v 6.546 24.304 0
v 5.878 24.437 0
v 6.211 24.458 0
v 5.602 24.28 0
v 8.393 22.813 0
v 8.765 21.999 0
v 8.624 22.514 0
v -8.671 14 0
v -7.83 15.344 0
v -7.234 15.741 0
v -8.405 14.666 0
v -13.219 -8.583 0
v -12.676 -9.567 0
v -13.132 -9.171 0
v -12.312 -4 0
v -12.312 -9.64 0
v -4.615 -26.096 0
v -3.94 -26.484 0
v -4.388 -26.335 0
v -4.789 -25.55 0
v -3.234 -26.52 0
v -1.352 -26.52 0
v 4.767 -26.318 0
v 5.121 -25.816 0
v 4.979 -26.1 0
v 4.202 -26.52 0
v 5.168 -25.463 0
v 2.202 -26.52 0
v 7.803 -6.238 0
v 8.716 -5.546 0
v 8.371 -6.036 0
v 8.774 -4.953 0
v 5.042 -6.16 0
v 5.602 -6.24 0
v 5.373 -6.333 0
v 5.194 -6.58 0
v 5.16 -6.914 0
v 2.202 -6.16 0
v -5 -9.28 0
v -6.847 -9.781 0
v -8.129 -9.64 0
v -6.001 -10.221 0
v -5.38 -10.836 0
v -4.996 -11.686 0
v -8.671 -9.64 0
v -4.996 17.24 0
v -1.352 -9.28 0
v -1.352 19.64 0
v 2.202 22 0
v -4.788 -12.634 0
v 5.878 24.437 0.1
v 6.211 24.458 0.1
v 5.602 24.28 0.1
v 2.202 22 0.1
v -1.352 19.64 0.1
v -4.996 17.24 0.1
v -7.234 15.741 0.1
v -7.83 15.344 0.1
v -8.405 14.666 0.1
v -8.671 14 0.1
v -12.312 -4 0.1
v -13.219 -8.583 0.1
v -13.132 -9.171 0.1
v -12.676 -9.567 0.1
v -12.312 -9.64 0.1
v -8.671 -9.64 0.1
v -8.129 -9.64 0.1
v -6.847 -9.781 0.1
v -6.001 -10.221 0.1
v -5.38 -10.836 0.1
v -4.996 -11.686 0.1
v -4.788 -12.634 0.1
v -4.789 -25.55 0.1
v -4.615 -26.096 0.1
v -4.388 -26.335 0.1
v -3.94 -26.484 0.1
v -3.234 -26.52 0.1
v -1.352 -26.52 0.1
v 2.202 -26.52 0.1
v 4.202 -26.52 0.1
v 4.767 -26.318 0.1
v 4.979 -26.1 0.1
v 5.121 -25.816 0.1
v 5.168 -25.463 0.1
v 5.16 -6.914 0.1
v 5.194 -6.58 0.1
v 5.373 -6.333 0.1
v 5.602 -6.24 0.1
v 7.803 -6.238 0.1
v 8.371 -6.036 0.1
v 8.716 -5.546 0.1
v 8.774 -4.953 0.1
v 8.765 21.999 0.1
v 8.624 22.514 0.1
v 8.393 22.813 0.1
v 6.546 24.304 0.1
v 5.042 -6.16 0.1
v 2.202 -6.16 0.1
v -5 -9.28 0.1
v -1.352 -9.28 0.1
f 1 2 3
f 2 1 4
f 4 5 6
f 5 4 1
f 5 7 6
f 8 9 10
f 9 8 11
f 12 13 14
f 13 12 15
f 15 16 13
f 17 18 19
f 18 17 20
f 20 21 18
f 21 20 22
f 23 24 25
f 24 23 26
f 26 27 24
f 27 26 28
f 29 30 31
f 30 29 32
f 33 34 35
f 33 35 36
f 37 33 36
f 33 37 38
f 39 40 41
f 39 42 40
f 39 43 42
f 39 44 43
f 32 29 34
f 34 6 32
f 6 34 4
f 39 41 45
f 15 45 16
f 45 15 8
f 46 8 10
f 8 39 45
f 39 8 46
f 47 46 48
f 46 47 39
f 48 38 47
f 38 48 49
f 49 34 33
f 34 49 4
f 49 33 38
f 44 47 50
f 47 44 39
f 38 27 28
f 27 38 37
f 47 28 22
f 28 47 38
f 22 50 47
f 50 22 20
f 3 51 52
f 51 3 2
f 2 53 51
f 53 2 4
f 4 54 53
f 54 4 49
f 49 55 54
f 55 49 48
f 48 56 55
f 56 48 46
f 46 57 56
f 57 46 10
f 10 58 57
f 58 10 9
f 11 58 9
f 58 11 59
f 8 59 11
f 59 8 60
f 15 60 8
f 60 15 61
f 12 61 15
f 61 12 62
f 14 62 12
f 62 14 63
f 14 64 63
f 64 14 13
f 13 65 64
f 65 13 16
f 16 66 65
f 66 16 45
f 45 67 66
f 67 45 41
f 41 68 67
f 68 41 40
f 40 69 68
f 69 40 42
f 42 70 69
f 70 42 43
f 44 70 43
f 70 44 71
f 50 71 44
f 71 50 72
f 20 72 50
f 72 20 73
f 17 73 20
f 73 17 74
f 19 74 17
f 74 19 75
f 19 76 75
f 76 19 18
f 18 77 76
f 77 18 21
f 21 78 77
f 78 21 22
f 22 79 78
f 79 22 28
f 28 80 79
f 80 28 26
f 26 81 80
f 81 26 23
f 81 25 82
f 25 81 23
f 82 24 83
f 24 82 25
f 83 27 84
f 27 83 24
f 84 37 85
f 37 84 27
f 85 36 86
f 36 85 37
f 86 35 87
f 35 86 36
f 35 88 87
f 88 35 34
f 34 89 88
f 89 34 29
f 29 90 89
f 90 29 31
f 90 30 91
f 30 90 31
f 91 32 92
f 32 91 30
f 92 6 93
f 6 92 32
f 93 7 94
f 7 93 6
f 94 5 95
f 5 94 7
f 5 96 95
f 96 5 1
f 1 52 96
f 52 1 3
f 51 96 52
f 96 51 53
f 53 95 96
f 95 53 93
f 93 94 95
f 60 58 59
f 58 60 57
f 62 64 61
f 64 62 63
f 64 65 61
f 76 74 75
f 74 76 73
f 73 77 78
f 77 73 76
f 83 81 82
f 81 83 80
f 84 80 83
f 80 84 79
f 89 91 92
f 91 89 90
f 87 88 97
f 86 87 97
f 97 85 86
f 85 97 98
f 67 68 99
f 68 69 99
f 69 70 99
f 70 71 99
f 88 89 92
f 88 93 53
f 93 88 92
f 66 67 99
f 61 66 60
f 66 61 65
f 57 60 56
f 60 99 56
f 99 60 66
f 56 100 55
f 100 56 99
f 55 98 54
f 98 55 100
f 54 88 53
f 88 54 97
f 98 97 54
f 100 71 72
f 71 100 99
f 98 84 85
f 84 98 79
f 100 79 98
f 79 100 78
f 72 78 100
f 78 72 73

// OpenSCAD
// file: s/13710as02.scad
use <../../lib.scad>
function ldraw_lib__s__13710as02() = [
// 0 ~Sticker Top for Technic Panel Fairing Smooth (Medium) Flat
// 0 Name: s\13710as02.dat
// 0 Author: Philippe Hurbain [Philo]
// 0 !LDRAW_ORG Subpart UPDATE 2022-02
// 0 !LICENSE Licensed under CC BY 2.0 and CC BY 4.0 : see CAreadme.txt
// 
// 0 BFC CERTIFY CCW
  [0,"BFC","CERTIFY"],
  [0,"BFC","CCW"],
// 
// 0 !HISTORY 2022-03-06 [PTadmin] Official Update 2022-02
// 
// 
// 0 // Top surface
// 4 16 16.364 -0.25 60.759 15.527 -0.25 61.145 14.695 -0.25 61.093 14.004 -0.25 60.7
  [4,16,16.364,-0.25,60.759,15.527,-0.25,61.145,14.695,-0.25,61.093,14.004,-0.25,60.7],
// 4 16 21.912 -0.25 54.998 20.983 -0.25 57.032 16.364 -0.25 60.759 14.004 -0.25 60.7
  [4,16,21.912,-0.25,54.998,20.983,-0.25,57.032,16.364,-0.25,60.759,14.004,-0.25,60.7],
// 3 16 21.912 -0.25 54.998 21.561 -0.25 56.284 20.983 -0.25 57.032
  [3,16,21.912,-0.25,54.998,21.561,-0.25,56.284,20.983,-0.25,57.032],
// 4 16 -18.084 -0.25 39.353 -19.575 -0.25 38.36 -21.013 -0.25 36.664 -21.677 -0.25 35
  [4,16,-18.084,-0.25,39.353,-19.575,-0.25,38.36,-21.013,-0.25,36.664,-21.677,-0.25,35],
// 4 16 -31.689 -0.25 -23.918 -30.78 -0.25 -10 -33.048 -0.25 -21.458 -32.83 -0.25 -22.928
  [4,16,-31.689,-0.25,-23.918,-30.78,-0.25,-10,-33.048,-0.25,-21.458,-32.83,-0.25,-22.928],
// 3 16 -31.689 -0.25 -23.918 -30.78 -0.25 -24.1 -30.78 -0.25 -10
  [3,16,-31.689,-0.25,-23.918,-30.78,-0.25,-24.1,-30.78,-0.25,-10],
// 4 16 -9.849 -0.25 -66.209 -11.972 -0.25 -63.874 -11.537 -0.25 -65.239 -10.971 -0.25 -65.837
  [4,16,-9.849,-0.25,-66.209,-11.972,-0.25,-63.874,-11.537,-0.25,-65.239,-10.971,-0.25,-65.837],
// 4 16 -3.379 -0.25 -66.3 -11.972 -0.25 -63.874 -9.849 -0.25 -66.209 -8.084 -0.25 -66.3
  [4,16,-3.379,-0.25,-66.3,-11.972,-0.25,-63.874,-9.849,-0.25,-66.209,-8.084,-0.25,-66.3],
// 4 16 12.802 -0.25 -64.539 10.504 -0.25 -66.3 11.917 -0.25 -65.795 12.448 -0.25 -65.249
  [4,16,12.802,-0.25,-64.539,10.504,-0.25,-66.3,11.917,-0.25,-65.795,12.448,-0.25,-65.249],
// 4 16 5.504 -0.25 -66.3 10.504 -0.25 -66.3 12.802 -0.25 -64.539 12.92 -0.25 -63.658
  [4,16,5.504,-0.25,-66.3,10.504,-0.25,-66.3,12.802,-0.25,-64.539,12.92,-0.25,-63.658],
// 4 16 19.507 -0.25 -15.595 20.928 -0.25 -15.089 21.79 -0.25 -13.866 21.935 -0.25 -12.382
  [4,16,19.507,-0.25,-15.595,20.928,-0.25,-15.089,21.79,-0.25,-13.866,21.935,-0.25,-12.382],
// 3 16 13.432 -0.25 -15.832 14.004 -0.25 -15.6 12.604 -0.25 -15.4
  [3,16,13.432,-0.25,-15.832,14.004,-0.25,-15.6,12.604,-0.25,-15.4],
// 3 16 12.984 -0.25 -16.45 13.432 -0.25 -15.832 12.604 -0.25 -15.4
  [3,16,12.984,-0.25,-16.45,13.432,-0.25,-15.832,12.604,-0.25,-15.4],
// 4 16 5.504 -0.25 -15.4 12.899 -0.25 -17.286 12.984 -0.25 -16.45 12.604 -0.25 -15.4
  [4,16,5.504,-0.25,-15.4,12.899,-0.25,-17.286,12.984,-0.25,-16.45,12.604,-0.25,-15.4],
// 3 16 -20.323 -0.25 -24.1 -17.118 -0.25 -24.453 -12.5 -0.25 -23.2
  [3,16,-20.323,-0.25,-24.1,-17.118,-0.25,-24.453,-12.5,-0.25,-23.2],
// 3 16 -17.118 -0.25 -24.453 -15.003 -0.25 -25.552 -12.5 -0.25 -23.2
  [3,16,-17.118,-0.25,-24.453,-15.003,-0.25,-25.552,-12.5,-0.25,-23.2],
// 3 16 -15.003 -0.25 -25.552 -13.45 -0.25 -27.089 -12.5 -0.25 -23.2
  [3,16,-15.003,-0.25,-25.552,-13.45,-0.25,-27.089,-12.5,-0.25,-23.2],
// 3 16 -13.45 -0.25 -27.089 -12.491 -0.25 -29.214 -12.5 -0.25 -23.2
  [3,16,-13.45,-0.25,-27.089,-12.491,-0.25,-29.214,-12.5,-0.25,-23.2],
// 3 16 14.004 -0.25 -15.6 19.507 -0.25 -15.595 21.935 -0.25 -12.382
  [3,16,14.004,-0.25,-15.6,19.507,-0.25,-15.595,21.935,-0.25,-12.382],
// 4 16 14.004 -0.25 60.7 14.004 -0.25 -15.6 21.935 -0.25 -12.382 21.912 -0.25 54.998
  [4,16,14.004,-0.25,60.7,14.004,-0.25,-15.6,21.935,-0.25,-12.382,21.912,-0.25,54.998],
// 3 16 -21.677 -0.25 -24.1 -20.323 -0.25 -24.1 -12.5 -0.25 -23.2
  [3,16,-21.677,-0.25,-24.1,-20.323,-0.25,-24.1,-12.5,-0.25,-23.2],
// 4 16 -30.78 -0.25 -24.1 -21.677 -0.25 -24.1 -21.677 -0.25 35 -30.78 -0.25 -10
  [4,16,-30.78,-0.25,-24.1,-21.677,-0.25,-24.1,-21.677,-0.25,35,-30.78,-0.25,-10],
// 3 16 -18.084 -0.25 39.353 -21.677 -0.25 35 -12.491 -0.25 43.1
  [3,16,-18.084,-0.25,39.353,-21.677,-0.25,35,-12.491,-0.25,43.1],
// 4 16 -21.677 -0.25 35 -21.677 -0.25 -24.1 -12.5 -0.25 -23.2 -12.491 -0.25 43.1
  [4,16,-21.677,-0.25,35,-21.677,-0.25,-24.1,-12.5,-0.25,-23.2,-12.491,-0.25,43.1],
// 4 16 -12.5 -0.25 -23.2 -3.379 -0.25 -23.2 -3.379 -0.25 49.1 -12.491 -0.25 43.1
  [4,16,-12.5,-0.25,-23.2,-3.379,-0.25,-23.2,-3.379,-0.25,49.1,-12.491,-0.25,43.1],
// 4 16 -3.379 -0.25 -23.2 5.504 -0.25 -15.4 5.504 -0.25 55 -3.379 -0.25 49.1
  [4,16,-3.379,-0.25,-23.2,5.504,-0.25,-15.4,5.504,-0.25,55,-3.379,-0.25,49.1],
// 4 16 14.004 -0.25 60.7 5.504 -0.25 55 12.604 -0.25 -15.4 14.004 -0.25 -15.6
  [4,16,14.004,-0.25,60.7,5.504,-0.25,55,12.604,-0.25,-15.4,14.004,-0.25,-15.6],
// 3 16 5.504 -0.25 -15.4 12.604 -0.25 -15.4 5.504 -0.25 55
  [3,16,5.504,-0.25,-15.4,12.604,-0.25,-15.4,5.504,-0.25,55],
// 4 16 -11.97 -0.25 -31.586 -3.379 -0.25 -23.2 -12.5 -0.25 -23.2 -12.491 -0.25 -29.214
  [4,16,-11.97,-0.25,-31.586,-3.379,-0.25,-23.2,-12.5,-0.25,-23.2,-12.491,-0.25,-29.214],
// 4 16 5.504 -0.25 -66.3 12.92 -0.25 -63.658 12.899 -0.25 -17.286 5.504 -0.25 -15.4
  [4,16,5.504,-0.25,-66.3,12.92,-0.25,-63.658,12.899,-0.25,-17.286,5.504,-0.25,-15.4],
// 4 16 -3.379 -0.25 -66.3 5.504 -0.25 -66.3 5.504 -0.25 -15.4 -3.379 -0.25 -23.2
  [4,16,-3.379,-0.25,-66.3,5.504,-0.25,-66.3,5.504,-0.25,-15.4,-3.379,-0.25,-23.2],
// 4 16 -11.972 -0.25 -63.874 -3.379 -0.25 -66.3 -3.379 -0.25 -23.2 -11.97 -0.25 -31.586
  [4,16,-11.972,-0.25,-63.874,-3.379,-0.25,-66.3,-3.379,-0.25,-23.2,-11.97,-0.25,-31.586],
];
module ldraw_lib__s__13710as02(step=0, col=false, unit=2/5, alt=false, line=0.2, solid=!$preview)
    makepoly(ldraw_lib__s__13710as02(), step=step, col=col, unit=unit, alt=alt, line=line, solid=solid);
ldraw_lib__s__13710as02(line=0.2);
// main file
use <../lib.scad>
use <s/13710as01.scad>
use <s/13710as02.scad>
function ldraw_lib__13710f() = [
// 0 Sticker Mindstorms EV3 #6 for Panel Smooth Medium (Needs Work)
// 0 Name: 13710f.dat
// 0 Author: Philippe Hurbain [Philo]
// 0 !LDRAW_ORG Part UPDATE 2022-02
// 0 !LICENSE Licensed under CC BY 2.0 and CC BY 4.0 : see CAreadme.txt
// 
// 0 !HELP To be used with panel 64391
// 
// 0 BFC CERTIFY CCW
  [0,"BFC","CERTIFY"],
  [0,"BFC","CCW"],
// 
// 0 !HISTORY 2022-03-06 [PTadmin] Official Update 2022-02
// 
// 
// 0 // Image file courtesy of the LEGO MINDSTORMS Team
// 0 // Needs Work: Missing more detailed fallback pattern
// 
// 1 16 0 0 0 1 0 0 0 1 0 0 0 1 s\13710as01.dat
  [1,16,0,0,0,1,0,0,0,1,0,0,0,1, ldraw_lib__s__13710as01()],
// 0 !TEXMAP START PLANAR -33.048 0 -66.3 -33.048 0 61.145 21.935 0 -66.3 13710f.png
// 0 !: 1 15 0 0 0 1 0 0 0 1 0 0 0 1 s\13710as02.dat
// 0 !TEXMAP FALLBACK
// 1 15 0 0 0 1 0 0 0 1 0 0 0 1 s\13710as02.dat
  [1,15,0,0,0,1,0,0,0,1,0,0,0,1, ldraw_lib__s__13710as02()],
// 0 !TEXMAP END
];
module ldraw_lib__13710f(step=0, col=false, unit=2/5, alt=false, line=0.2, solid=!$preview)
    makepoly(ldraw_lib__13710f(), step=step, col=col, unit=unit, alt=alt, line=line, solid=solid);
ldraw_lib__13710f(line=0.2);
